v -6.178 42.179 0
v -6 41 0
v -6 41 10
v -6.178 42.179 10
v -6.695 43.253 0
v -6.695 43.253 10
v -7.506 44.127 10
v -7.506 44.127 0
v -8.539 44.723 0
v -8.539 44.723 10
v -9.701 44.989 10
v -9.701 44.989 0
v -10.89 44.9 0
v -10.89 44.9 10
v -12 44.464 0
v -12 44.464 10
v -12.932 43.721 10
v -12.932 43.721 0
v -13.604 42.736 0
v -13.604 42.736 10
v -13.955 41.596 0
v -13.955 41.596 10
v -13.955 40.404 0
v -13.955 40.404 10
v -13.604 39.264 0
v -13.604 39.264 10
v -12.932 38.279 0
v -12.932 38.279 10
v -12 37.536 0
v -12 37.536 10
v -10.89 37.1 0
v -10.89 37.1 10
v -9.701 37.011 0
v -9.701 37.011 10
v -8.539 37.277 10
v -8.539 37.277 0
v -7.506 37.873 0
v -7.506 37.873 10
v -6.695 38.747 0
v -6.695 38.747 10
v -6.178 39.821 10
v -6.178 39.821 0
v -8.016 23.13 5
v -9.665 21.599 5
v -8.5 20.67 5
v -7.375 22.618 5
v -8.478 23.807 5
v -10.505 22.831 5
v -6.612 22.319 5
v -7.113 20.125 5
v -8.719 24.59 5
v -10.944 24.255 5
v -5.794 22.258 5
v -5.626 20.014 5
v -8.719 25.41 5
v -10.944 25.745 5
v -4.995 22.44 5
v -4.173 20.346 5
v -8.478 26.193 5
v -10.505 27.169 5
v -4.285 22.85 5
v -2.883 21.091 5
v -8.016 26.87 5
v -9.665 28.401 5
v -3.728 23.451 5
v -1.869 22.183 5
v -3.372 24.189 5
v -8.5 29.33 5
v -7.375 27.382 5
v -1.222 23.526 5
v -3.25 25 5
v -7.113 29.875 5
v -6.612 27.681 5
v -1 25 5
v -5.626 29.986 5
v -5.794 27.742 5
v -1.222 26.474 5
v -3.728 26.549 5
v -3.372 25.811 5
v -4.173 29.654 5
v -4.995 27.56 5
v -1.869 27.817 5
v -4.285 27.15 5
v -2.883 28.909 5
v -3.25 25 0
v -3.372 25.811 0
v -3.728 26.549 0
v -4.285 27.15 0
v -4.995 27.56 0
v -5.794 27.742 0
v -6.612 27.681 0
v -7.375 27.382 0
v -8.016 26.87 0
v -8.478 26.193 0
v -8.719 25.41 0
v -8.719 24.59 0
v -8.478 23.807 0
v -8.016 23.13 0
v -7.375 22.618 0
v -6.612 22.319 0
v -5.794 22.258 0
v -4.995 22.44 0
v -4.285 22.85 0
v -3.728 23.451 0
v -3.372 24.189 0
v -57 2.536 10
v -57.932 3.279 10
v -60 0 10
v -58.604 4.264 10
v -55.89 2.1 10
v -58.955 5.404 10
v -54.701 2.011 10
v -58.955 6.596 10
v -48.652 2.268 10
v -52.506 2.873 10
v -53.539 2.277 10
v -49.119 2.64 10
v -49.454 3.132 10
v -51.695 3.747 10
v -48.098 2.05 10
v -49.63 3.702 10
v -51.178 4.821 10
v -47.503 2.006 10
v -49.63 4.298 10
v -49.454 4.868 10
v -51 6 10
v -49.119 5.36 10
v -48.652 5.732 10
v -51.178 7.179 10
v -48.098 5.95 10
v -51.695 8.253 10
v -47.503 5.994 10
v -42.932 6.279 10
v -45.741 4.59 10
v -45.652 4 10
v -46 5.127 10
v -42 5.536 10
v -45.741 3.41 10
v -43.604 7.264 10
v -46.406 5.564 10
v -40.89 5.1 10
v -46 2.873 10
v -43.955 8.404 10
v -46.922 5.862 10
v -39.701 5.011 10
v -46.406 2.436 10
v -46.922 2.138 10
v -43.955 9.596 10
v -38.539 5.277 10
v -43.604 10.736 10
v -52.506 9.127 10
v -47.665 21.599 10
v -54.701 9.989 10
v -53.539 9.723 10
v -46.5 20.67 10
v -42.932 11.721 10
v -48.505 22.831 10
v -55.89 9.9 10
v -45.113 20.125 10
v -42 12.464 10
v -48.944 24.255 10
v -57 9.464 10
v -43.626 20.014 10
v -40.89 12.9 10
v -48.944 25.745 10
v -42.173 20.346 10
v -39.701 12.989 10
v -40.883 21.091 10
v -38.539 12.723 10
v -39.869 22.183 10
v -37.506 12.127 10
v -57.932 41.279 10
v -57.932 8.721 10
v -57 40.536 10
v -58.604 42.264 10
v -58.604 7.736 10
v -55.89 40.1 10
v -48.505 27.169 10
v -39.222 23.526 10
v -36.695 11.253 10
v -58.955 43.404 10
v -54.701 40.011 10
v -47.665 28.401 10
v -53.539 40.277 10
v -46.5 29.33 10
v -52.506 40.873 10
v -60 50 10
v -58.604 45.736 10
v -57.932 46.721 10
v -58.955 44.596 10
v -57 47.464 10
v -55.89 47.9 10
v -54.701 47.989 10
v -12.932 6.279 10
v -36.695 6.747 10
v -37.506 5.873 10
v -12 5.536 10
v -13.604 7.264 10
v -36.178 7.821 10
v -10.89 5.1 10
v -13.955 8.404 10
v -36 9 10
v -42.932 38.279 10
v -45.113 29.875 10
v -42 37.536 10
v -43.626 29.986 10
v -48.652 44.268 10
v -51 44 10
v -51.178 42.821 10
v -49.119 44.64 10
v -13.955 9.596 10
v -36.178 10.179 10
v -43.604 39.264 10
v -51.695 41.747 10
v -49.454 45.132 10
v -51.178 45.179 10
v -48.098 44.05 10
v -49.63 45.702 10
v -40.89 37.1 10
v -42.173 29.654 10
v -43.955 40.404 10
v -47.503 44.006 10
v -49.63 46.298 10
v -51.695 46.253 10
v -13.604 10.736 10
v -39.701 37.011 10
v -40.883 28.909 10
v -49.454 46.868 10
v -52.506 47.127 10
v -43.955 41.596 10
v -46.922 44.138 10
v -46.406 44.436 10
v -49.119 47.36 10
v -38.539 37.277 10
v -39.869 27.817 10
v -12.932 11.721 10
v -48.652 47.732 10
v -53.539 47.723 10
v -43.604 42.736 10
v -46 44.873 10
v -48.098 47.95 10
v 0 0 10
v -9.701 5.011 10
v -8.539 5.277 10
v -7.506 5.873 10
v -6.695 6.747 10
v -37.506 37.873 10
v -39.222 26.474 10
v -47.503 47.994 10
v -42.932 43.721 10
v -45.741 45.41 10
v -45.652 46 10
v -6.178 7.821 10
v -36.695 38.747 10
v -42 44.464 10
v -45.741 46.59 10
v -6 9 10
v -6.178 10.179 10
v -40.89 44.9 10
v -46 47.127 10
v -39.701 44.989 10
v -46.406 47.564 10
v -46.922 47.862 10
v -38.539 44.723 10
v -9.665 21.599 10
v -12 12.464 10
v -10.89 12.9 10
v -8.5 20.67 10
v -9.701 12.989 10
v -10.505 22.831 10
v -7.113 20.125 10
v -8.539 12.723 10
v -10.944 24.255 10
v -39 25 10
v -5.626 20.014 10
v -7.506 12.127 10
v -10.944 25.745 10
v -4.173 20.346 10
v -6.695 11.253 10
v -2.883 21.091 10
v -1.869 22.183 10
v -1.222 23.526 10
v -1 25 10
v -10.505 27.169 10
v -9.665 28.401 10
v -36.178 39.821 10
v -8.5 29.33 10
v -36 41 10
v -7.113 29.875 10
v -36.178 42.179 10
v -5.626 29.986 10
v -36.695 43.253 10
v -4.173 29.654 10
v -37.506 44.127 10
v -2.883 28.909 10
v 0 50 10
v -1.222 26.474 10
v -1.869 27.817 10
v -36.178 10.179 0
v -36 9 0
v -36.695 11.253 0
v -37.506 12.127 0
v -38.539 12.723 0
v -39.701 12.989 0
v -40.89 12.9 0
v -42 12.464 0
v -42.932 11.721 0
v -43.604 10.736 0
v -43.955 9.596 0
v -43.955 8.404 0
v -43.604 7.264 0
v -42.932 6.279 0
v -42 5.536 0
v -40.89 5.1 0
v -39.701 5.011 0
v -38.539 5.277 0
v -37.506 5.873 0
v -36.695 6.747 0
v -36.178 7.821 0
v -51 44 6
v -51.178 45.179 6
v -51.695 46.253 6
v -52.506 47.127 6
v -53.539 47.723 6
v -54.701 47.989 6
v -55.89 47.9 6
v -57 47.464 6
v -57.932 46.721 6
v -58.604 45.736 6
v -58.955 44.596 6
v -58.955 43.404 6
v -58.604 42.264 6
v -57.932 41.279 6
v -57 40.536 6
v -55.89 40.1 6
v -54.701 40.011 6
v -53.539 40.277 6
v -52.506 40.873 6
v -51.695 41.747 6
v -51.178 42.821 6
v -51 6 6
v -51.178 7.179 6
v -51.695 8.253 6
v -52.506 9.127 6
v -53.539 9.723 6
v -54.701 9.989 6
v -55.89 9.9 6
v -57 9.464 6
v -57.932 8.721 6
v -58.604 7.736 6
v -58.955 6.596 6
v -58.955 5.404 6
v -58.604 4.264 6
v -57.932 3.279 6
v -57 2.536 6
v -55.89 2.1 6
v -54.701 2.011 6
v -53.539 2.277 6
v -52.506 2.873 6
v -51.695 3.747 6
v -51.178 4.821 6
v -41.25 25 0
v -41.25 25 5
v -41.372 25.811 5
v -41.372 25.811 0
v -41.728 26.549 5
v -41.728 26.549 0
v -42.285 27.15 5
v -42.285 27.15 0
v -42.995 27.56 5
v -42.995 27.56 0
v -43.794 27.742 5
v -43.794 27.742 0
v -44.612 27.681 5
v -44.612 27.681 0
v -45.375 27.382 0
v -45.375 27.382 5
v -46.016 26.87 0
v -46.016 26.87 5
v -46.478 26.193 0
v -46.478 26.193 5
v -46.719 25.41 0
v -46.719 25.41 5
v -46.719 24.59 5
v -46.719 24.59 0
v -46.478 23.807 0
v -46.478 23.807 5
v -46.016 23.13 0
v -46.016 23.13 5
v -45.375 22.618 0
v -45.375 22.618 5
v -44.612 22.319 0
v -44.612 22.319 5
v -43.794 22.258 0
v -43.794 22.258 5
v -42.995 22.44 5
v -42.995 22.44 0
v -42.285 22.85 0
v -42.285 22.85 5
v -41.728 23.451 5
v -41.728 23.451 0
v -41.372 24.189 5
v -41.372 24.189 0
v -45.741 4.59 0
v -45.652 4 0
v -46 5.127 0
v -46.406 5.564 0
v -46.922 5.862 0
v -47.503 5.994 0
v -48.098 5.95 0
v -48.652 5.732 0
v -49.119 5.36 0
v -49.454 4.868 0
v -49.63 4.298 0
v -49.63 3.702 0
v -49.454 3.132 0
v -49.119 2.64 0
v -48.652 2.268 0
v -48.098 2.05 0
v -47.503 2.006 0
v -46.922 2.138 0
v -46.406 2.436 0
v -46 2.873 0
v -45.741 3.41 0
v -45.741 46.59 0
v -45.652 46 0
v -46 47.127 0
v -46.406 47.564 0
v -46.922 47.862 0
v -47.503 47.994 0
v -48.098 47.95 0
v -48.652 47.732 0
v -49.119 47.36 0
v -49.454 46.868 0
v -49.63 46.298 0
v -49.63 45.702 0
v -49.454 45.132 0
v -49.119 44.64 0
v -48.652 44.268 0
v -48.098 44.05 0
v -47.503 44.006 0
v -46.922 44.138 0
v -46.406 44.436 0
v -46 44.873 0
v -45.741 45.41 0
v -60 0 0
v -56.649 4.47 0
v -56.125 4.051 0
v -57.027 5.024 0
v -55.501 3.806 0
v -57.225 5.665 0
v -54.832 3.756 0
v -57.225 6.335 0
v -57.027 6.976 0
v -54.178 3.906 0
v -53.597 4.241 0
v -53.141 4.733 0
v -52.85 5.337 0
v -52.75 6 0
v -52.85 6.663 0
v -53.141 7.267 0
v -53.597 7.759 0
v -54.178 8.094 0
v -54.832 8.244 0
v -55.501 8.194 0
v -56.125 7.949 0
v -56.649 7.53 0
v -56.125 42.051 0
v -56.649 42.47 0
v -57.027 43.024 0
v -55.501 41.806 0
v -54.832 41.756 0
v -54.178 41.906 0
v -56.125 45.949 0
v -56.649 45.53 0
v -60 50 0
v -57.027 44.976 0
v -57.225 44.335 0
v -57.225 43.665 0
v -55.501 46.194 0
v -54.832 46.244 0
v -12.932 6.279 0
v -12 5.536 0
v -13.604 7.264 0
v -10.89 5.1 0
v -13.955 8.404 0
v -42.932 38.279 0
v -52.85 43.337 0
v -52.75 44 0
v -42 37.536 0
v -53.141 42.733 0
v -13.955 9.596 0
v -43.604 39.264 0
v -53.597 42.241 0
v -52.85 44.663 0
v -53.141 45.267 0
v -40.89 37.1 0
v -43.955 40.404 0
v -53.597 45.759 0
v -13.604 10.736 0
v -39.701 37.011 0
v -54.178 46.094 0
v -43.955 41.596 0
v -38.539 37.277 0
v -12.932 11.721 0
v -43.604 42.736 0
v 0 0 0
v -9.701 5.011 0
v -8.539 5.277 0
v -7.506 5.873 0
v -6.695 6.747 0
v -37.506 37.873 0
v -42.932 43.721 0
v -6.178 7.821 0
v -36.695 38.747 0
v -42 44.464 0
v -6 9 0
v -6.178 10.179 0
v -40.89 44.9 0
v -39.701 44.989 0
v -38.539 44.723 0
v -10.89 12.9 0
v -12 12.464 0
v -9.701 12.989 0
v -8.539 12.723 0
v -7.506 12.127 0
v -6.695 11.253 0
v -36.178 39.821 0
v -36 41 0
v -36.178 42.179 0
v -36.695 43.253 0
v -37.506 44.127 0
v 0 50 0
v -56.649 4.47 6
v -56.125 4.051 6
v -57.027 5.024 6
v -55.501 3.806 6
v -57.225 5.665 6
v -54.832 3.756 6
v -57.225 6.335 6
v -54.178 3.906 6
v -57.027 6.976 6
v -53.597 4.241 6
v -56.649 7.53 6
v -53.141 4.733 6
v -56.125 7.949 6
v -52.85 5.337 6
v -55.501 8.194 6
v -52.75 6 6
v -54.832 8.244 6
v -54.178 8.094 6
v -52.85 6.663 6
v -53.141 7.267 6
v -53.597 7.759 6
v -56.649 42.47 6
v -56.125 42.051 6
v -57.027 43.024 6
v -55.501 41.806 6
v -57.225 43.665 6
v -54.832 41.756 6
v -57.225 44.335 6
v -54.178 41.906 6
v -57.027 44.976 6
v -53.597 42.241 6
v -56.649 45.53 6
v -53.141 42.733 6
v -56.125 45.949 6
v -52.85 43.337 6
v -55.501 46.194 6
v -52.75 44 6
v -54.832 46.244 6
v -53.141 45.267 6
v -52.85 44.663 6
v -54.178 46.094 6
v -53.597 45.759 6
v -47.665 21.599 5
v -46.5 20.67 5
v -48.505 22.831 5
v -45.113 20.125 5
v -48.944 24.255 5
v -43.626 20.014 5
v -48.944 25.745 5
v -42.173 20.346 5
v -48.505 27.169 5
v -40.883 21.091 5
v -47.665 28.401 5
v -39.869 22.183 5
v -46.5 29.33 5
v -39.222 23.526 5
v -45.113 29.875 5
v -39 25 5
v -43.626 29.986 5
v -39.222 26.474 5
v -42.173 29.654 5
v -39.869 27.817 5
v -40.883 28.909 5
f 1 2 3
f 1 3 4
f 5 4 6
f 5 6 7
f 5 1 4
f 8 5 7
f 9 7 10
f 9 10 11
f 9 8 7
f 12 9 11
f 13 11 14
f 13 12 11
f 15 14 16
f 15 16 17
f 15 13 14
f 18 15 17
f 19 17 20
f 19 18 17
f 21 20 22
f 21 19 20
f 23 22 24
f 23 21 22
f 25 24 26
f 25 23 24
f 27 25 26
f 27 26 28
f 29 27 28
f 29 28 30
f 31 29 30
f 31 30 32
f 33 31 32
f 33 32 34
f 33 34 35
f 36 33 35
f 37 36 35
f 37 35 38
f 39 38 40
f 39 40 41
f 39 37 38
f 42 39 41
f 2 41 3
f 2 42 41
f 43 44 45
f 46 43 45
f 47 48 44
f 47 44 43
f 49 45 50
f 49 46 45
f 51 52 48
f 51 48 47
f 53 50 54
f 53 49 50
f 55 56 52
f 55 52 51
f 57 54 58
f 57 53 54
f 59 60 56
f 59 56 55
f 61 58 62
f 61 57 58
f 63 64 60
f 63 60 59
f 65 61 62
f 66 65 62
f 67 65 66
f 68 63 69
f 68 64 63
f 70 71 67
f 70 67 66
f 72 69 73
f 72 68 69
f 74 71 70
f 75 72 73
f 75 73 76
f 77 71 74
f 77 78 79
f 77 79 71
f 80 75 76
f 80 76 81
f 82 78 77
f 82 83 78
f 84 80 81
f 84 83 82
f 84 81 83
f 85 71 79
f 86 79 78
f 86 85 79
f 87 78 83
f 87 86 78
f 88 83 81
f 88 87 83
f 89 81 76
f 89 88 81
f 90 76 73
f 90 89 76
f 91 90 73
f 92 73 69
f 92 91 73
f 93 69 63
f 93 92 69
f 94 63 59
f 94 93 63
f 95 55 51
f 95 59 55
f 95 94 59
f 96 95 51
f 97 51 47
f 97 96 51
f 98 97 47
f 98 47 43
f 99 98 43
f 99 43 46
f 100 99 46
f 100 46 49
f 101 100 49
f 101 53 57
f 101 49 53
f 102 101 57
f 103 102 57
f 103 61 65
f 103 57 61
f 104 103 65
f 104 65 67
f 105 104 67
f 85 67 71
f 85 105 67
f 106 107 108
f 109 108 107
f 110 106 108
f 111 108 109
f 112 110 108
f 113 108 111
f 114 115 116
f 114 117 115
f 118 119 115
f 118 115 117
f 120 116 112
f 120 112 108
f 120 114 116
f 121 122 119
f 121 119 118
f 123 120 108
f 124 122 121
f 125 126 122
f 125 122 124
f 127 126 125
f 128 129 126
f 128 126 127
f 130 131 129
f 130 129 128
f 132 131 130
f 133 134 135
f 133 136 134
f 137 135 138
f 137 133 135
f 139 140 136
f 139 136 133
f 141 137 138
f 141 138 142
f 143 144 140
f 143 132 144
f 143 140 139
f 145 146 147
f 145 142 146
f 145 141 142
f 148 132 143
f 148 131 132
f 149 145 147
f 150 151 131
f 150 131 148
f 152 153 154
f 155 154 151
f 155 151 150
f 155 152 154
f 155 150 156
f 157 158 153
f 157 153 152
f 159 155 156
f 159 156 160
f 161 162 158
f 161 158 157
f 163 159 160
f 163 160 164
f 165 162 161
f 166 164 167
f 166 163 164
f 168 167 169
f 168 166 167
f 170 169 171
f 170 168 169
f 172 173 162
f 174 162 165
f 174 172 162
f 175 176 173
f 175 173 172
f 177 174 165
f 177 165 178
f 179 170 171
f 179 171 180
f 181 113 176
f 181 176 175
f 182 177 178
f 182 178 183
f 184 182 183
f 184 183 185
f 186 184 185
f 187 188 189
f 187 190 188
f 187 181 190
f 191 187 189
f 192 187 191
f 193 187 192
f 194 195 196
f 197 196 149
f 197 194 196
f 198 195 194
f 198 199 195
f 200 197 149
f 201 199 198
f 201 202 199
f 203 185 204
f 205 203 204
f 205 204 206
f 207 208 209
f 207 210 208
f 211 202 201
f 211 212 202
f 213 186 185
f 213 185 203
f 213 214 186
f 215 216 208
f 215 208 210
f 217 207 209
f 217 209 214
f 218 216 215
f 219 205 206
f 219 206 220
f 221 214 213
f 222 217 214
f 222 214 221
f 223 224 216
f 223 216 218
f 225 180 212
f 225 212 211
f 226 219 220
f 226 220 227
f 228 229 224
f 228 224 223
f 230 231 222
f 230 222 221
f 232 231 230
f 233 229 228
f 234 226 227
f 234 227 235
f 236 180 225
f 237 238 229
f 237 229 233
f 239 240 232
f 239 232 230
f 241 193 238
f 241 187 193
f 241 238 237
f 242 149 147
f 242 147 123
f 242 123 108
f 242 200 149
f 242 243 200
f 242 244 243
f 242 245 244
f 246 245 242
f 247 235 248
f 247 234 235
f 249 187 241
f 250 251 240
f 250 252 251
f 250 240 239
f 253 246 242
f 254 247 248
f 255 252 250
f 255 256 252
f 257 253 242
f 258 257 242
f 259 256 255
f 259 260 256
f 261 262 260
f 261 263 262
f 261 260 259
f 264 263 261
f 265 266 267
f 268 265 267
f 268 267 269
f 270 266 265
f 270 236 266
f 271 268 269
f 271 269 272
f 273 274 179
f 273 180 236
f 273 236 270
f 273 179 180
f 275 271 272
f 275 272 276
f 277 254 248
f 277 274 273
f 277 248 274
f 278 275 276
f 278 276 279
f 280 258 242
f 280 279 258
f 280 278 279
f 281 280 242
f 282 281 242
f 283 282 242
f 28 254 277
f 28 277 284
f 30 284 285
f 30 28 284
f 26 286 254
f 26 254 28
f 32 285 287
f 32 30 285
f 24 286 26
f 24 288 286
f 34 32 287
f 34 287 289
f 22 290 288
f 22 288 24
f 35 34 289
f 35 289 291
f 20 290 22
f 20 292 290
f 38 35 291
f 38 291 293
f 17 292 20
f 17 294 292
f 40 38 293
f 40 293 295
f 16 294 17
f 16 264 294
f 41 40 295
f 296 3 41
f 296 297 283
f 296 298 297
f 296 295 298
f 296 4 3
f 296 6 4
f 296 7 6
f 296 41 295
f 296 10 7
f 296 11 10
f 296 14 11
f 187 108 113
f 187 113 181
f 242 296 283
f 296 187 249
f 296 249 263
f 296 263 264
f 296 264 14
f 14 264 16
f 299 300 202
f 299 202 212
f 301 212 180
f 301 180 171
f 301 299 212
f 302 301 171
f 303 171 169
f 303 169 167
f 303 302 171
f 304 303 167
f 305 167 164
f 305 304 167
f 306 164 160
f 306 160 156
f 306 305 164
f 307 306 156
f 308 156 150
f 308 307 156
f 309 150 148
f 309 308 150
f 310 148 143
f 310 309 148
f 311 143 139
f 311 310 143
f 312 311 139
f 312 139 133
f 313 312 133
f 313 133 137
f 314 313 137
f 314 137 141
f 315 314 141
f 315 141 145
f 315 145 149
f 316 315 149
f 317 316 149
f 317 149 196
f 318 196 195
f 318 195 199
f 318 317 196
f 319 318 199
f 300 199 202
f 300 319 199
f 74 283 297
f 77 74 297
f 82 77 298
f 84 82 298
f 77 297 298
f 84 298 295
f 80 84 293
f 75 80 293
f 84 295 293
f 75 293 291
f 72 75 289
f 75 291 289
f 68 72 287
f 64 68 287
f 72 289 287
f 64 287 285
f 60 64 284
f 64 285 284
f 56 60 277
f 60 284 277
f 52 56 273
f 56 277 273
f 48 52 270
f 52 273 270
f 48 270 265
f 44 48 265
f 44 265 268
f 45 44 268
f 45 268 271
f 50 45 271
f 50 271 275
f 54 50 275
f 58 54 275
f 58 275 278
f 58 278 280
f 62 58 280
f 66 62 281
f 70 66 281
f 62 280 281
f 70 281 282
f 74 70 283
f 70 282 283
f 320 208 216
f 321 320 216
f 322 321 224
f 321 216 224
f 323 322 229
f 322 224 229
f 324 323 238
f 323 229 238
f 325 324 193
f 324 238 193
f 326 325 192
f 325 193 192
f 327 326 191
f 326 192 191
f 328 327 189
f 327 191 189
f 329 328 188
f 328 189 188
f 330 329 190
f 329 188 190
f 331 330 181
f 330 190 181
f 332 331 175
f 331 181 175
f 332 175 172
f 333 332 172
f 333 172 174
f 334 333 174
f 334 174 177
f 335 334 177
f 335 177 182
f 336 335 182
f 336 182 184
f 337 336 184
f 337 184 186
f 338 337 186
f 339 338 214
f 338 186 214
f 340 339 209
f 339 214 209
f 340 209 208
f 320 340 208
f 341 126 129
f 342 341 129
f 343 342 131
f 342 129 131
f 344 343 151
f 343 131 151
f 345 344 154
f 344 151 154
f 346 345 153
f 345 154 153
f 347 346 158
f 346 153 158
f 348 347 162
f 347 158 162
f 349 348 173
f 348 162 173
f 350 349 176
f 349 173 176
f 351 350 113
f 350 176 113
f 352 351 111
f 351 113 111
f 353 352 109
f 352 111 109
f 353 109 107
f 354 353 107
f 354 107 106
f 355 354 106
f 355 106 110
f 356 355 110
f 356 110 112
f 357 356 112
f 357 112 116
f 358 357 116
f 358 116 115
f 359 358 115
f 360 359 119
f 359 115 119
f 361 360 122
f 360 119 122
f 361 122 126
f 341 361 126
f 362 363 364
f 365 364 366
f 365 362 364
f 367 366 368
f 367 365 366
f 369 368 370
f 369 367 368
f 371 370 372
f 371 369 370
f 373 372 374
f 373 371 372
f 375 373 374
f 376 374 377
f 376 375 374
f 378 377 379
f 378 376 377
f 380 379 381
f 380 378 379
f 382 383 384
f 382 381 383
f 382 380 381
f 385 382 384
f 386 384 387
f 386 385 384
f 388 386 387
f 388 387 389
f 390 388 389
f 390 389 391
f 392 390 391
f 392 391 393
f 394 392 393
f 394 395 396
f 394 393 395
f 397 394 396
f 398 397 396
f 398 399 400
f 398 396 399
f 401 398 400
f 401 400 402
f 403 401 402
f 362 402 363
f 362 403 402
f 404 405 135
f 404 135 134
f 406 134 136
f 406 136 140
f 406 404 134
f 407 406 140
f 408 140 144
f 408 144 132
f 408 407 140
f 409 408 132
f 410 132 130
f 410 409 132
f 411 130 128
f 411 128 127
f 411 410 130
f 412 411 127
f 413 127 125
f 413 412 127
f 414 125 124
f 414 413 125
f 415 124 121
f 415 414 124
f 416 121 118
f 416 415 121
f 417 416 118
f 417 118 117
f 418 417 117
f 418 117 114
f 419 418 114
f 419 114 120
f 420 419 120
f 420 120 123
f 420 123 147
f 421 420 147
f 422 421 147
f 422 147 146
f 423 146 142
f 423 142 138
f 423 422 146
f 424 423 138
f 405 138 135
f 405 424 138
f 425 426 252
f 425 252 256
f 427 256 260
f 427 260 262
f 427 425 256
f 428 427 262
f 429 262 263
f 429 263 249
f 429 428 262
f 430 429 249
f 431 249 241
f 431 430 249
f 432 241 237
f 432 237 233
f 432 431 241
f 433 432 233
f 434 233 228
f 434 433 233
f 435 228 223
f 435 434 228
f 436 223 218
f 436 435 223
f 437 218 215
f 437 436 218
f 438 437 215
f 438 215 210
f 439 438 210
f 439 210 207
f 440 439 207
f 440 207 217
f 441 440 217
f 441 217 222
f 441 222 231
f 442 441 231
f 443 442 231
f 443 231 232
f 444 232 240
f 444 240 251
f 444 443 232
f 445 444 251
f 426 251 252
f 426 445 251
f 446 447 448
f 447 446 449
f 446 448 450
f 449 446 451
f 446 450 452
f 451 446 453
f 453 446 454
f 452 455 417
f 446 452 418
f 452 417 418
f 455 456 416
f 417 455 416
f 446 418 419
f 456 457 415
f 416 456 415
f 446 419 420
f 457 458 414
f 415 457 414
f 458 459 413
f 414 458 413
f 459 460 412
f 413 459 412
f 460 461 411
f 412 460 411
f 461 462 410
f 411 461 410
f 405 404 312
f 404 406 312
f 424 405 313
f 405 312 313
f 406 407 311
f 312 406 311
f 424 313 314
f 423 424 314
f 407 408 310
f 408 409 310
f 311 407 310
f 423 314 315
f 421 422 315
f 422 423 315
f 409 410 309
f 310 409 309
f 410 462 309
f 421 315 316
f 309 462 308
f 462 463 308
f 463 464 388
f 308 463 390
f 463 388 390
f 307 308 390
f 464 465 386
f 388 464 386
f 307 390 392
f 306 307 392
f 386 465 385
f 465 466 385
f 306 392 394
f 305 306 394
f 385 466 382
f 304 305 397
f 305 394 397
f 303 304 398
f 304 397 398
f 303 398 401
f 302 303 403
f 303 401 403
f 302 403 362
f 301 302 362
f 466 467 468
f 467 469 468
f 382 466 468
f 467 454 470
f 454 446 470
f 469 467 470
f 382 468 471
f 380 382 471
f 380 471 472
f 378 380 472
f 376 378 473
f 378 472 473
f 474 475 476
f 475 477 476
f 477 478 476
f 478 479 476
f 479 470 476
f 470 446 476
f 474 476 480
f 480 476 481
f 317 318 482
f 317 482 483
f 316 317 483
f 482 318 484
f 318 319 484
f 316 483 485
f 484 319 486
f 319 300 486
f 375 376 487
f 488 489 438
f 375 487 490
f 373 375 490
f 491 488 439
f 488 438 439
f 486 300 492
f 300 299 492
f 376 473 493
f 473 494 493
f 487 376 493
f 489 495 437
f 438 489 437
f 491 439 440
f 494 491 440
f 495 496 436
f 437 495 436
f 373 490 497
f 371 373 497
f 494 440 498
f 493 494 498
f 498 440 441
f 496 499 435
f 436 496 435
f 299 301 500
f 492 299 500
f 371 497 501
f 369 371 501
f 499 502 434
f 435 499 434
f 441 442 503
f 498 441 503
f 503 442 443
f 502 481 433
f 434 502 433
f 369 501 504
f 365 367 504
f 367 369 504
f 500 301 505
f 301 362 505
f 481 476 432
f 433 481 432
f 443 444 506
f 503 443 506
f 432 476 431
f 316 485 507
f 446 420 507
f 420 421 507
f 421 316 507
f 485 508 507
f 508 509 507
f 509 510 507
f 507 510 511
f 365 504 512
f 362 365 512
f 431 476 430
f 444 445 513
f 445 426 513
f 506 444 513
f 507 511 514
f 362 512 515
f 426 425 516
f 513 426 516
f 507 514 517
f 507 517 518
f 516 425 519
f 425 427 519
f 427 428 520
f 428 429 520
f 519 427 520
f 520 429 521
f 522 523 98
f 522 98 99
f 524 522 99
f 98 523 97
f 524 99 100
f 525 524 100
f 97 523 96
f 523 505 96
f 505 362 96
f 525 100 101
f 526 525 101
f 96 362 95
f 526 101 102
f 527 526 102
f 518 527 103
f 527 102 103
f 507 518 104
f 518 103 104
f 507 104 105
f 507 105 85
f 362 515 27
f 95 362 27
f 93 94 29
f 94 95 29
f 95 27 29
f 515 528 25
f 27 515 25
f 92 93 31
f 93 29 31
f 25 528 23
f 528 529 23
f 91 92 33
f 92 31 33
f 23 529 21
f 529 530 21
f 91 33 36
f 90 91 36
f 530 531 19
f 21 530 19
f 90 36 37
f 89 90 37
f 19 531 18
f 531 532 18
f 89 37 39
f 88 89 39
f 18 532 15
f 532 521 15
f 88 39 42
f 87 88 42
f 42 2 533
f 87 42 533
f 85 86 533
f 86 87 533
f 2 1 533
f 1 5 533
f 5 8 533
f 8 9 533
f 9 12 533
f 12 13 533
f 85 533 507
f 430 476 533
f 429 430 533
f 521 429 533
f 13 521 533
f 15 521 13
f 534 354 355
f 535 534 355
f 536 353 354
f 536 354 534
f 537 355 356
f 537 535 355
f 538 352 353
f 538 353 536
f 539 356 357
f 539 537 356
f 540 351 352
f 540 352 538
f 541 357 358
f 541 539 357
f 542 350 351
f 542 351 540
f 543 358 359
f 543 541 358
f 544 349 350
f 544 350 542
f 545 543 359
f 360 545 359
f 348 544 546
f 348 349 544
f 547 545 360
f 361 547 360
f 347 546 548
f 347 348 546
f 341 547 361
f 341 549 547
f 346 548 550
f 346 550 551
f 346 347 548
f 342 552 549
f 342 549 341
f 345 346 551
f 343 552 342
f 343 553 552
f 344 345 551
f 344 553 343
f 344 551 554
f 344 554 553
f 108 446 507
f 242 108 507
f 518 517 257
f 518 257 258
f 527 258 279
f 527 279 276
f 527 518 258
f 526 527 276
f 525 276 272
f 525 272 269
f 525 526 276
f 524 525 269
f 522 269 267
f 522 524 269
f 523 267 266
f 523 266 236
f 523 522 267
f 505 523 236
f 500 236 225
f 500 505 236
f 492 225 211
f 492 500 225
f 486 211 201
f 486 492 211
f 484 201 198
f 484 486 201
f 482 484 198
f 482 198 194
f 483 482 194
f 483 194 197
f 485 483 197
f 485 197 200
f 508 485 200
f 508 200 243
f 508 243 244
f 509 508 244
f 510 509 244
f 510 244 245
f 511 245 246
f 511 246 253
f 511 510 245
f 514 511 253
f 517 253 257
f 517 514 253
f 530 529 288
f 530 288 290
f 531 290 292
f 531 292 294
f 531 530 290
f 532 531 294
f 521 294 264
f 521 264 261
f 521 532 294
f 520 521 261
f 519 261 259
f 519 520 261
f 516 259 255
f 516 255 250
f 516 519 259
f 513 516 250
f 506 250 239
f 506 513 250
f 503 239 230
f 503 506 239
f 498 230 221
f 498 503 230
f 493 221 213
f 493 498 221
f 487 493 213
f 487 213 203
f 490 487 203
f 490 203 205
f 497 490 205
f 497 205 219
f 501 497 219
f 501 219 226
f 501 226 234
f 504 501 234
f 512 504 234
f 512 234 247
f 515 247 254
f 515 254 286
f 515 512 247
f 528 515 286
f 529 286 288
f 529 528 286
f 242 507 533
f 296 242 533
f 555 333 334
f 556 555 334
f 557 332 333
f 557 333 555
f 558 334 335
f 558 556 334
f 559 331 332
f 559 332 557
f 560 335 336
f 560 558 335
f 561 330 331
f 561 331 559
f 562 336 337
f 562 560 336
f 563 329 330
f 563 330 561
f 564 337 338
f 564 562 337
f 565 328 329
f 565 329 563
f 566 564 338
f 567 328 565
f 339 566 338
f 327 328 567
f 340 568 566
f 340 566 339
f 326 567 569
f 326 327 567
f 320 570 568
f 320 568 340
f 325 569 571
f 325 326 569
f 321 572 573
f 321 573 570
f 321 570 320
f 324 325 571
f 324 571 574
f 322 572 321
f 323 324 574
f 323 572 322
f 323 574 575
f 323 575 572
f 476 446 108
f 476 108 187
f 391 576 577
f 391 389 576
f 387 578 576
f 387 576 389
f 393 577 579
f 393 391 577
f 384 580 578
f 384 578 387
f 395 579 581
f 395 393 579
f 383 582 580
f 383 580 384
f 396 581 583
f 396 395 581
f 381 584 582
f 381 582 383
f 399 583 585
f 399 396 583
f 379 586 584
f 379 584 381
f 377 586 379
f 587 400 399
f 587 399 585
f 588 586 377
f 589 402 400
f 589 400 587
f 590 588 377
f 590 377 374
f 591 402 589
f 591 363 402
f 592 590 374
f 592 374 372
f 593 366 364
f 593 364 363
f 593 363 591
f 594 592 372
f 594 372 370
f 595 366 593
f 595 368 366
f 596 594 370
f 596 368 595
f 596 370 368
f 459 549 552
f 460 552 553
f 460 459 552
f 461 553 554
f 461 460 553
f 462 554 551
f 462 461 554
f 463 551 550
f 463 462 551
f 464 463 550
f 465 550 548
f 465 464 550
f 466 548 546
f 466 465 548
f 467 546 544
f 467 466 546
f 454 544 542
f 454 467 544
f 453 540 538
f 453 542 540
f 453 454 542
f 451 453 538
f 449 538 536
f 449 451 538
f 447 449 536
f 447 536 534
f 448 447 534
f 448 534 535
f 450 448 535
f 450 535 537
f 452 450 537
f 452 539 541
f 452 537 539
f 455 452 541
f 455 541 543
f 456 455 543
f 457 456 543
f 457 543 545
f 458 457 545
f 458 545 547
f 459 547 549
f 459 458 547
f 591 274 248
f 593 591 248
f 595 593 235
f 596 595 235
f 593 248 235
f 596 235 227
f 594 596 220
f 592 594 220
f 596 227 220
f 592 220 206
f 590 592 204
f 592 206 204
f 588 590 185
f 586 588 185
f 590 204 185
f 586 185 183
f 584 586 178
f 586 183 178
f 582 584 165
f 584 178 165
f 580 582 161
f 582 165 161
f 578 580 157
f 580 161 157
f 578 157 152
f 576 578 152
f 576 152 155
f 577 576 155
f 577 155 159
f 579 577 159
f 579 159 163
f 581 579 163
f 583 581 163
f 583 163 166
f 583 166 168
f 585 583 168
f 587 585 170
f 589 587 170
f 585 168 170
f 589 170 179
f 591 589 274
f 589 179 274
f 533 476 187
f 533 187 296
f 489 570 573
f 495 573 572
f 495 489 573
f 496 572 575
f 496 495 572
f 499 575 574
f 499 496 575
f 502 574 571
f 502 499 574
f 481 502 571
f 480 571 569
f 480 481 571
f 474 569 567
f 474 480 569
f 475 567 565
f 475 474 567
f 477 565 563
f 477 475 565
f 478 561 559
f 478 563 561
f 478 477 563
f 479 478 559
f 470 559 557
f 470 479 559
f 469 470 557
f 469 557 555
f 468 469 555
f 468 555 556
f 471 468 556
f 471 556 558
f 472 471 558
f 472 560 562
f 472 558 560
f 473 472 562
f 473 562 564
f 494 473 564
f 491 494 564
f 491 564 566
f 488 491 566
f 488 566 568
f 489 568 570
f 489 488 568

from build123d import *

# Parameters (mm, degrees)
SKETCH1_W           = 60
SKETCH1_H           = 50
SKETCH1_R           = 4
SKETCH1_R_2         = 2.25
SKETCH1_R_3         = 2.75
SKETCH1_R_4         = 2
BOSS_EXTRUDE2_DEPTH = 10
SKETCH2_R           = 4
CUT_EXTRUDE1_DEPTH  = 4
SKETCH3_R           = 5
CUT_EXTRUDE2_DEPTH  = 5


with BuildPart() as part:
    # Sketch1 → Boss-Extrude2 (new body)
    with BuildSketch(Plane.XY):
        with Locations((-30, 25)):
            Rectangle(SKETCH1_W, SKETCH1_H)
        with Locations((-10, 41)):
            Circle(SKETCH1_R, mode=Mode.SUBTRACT)
        with Locations((-10, 9)):
            Circle(SKETCH1_R, mode=Mode.SUBTRACT)
        with Locations((-40, 9)):
            Circle(SKETCH1_R, mode=Mode.SUBTRACT)
        with Locations((-40, 41)):
            Circle(SKETCH1_R, mode=Mode.SUBTRACT)
        with Locations((-55, 44)):
            Circle(SKETCH1_R_2, mode=Mode.SUBTRACT)
        with Locations((-55, 6)):
            Circle(SKETCH1_R_2, mode=Mode.SUBTRACT)
        with Locations((-44, 25)):
            Circle(SKETCH1_R_3, mode=Mode.SUBTRACT)
        with Locations((-6, 25)):
            Circle(SKETCH1_R_3, mode=Mode.SUBTRACT)
        with Locations((-47.652499067, 46)):
            Circle(SKETCH1_R_4, mode=Mode.SUBTRACT)
        with Locations((-47.652499067, 4)):
            Circle(SKETCH1_R_4, mode=Mode.SUBTRACT)
    extrude(amount=BOSS_EXTRUDE2_DEPTH)

    # Sketch2 → Cut-Extrude1 (cut)
    with BuildSketch(Plane.XY.offset(10)):
        with Locations((-55, 44)):
            Circle(SKETCH2_R)
        with Locations((-55, 6)):
            Circle(SKETCH2_R)
    extrude(amount=-CUT_EXTRUDE1_DEPTH, mode=Mode.SUBTRACT)

    # Sketch3 → Cut-Extrude2 (cut)
    with BuildSketch(Plane.XY.offset(10)):
        with Locations((-44, 25)):
            Circle(SKETCH3_R)
        with Locations((-6, 25)):
            Circle(SKETCH3_R)
    extrude(amount=-CUT_EXTRUDE2_DEPTH, mode=Mode.SUBTRACT)


solid = part.part
